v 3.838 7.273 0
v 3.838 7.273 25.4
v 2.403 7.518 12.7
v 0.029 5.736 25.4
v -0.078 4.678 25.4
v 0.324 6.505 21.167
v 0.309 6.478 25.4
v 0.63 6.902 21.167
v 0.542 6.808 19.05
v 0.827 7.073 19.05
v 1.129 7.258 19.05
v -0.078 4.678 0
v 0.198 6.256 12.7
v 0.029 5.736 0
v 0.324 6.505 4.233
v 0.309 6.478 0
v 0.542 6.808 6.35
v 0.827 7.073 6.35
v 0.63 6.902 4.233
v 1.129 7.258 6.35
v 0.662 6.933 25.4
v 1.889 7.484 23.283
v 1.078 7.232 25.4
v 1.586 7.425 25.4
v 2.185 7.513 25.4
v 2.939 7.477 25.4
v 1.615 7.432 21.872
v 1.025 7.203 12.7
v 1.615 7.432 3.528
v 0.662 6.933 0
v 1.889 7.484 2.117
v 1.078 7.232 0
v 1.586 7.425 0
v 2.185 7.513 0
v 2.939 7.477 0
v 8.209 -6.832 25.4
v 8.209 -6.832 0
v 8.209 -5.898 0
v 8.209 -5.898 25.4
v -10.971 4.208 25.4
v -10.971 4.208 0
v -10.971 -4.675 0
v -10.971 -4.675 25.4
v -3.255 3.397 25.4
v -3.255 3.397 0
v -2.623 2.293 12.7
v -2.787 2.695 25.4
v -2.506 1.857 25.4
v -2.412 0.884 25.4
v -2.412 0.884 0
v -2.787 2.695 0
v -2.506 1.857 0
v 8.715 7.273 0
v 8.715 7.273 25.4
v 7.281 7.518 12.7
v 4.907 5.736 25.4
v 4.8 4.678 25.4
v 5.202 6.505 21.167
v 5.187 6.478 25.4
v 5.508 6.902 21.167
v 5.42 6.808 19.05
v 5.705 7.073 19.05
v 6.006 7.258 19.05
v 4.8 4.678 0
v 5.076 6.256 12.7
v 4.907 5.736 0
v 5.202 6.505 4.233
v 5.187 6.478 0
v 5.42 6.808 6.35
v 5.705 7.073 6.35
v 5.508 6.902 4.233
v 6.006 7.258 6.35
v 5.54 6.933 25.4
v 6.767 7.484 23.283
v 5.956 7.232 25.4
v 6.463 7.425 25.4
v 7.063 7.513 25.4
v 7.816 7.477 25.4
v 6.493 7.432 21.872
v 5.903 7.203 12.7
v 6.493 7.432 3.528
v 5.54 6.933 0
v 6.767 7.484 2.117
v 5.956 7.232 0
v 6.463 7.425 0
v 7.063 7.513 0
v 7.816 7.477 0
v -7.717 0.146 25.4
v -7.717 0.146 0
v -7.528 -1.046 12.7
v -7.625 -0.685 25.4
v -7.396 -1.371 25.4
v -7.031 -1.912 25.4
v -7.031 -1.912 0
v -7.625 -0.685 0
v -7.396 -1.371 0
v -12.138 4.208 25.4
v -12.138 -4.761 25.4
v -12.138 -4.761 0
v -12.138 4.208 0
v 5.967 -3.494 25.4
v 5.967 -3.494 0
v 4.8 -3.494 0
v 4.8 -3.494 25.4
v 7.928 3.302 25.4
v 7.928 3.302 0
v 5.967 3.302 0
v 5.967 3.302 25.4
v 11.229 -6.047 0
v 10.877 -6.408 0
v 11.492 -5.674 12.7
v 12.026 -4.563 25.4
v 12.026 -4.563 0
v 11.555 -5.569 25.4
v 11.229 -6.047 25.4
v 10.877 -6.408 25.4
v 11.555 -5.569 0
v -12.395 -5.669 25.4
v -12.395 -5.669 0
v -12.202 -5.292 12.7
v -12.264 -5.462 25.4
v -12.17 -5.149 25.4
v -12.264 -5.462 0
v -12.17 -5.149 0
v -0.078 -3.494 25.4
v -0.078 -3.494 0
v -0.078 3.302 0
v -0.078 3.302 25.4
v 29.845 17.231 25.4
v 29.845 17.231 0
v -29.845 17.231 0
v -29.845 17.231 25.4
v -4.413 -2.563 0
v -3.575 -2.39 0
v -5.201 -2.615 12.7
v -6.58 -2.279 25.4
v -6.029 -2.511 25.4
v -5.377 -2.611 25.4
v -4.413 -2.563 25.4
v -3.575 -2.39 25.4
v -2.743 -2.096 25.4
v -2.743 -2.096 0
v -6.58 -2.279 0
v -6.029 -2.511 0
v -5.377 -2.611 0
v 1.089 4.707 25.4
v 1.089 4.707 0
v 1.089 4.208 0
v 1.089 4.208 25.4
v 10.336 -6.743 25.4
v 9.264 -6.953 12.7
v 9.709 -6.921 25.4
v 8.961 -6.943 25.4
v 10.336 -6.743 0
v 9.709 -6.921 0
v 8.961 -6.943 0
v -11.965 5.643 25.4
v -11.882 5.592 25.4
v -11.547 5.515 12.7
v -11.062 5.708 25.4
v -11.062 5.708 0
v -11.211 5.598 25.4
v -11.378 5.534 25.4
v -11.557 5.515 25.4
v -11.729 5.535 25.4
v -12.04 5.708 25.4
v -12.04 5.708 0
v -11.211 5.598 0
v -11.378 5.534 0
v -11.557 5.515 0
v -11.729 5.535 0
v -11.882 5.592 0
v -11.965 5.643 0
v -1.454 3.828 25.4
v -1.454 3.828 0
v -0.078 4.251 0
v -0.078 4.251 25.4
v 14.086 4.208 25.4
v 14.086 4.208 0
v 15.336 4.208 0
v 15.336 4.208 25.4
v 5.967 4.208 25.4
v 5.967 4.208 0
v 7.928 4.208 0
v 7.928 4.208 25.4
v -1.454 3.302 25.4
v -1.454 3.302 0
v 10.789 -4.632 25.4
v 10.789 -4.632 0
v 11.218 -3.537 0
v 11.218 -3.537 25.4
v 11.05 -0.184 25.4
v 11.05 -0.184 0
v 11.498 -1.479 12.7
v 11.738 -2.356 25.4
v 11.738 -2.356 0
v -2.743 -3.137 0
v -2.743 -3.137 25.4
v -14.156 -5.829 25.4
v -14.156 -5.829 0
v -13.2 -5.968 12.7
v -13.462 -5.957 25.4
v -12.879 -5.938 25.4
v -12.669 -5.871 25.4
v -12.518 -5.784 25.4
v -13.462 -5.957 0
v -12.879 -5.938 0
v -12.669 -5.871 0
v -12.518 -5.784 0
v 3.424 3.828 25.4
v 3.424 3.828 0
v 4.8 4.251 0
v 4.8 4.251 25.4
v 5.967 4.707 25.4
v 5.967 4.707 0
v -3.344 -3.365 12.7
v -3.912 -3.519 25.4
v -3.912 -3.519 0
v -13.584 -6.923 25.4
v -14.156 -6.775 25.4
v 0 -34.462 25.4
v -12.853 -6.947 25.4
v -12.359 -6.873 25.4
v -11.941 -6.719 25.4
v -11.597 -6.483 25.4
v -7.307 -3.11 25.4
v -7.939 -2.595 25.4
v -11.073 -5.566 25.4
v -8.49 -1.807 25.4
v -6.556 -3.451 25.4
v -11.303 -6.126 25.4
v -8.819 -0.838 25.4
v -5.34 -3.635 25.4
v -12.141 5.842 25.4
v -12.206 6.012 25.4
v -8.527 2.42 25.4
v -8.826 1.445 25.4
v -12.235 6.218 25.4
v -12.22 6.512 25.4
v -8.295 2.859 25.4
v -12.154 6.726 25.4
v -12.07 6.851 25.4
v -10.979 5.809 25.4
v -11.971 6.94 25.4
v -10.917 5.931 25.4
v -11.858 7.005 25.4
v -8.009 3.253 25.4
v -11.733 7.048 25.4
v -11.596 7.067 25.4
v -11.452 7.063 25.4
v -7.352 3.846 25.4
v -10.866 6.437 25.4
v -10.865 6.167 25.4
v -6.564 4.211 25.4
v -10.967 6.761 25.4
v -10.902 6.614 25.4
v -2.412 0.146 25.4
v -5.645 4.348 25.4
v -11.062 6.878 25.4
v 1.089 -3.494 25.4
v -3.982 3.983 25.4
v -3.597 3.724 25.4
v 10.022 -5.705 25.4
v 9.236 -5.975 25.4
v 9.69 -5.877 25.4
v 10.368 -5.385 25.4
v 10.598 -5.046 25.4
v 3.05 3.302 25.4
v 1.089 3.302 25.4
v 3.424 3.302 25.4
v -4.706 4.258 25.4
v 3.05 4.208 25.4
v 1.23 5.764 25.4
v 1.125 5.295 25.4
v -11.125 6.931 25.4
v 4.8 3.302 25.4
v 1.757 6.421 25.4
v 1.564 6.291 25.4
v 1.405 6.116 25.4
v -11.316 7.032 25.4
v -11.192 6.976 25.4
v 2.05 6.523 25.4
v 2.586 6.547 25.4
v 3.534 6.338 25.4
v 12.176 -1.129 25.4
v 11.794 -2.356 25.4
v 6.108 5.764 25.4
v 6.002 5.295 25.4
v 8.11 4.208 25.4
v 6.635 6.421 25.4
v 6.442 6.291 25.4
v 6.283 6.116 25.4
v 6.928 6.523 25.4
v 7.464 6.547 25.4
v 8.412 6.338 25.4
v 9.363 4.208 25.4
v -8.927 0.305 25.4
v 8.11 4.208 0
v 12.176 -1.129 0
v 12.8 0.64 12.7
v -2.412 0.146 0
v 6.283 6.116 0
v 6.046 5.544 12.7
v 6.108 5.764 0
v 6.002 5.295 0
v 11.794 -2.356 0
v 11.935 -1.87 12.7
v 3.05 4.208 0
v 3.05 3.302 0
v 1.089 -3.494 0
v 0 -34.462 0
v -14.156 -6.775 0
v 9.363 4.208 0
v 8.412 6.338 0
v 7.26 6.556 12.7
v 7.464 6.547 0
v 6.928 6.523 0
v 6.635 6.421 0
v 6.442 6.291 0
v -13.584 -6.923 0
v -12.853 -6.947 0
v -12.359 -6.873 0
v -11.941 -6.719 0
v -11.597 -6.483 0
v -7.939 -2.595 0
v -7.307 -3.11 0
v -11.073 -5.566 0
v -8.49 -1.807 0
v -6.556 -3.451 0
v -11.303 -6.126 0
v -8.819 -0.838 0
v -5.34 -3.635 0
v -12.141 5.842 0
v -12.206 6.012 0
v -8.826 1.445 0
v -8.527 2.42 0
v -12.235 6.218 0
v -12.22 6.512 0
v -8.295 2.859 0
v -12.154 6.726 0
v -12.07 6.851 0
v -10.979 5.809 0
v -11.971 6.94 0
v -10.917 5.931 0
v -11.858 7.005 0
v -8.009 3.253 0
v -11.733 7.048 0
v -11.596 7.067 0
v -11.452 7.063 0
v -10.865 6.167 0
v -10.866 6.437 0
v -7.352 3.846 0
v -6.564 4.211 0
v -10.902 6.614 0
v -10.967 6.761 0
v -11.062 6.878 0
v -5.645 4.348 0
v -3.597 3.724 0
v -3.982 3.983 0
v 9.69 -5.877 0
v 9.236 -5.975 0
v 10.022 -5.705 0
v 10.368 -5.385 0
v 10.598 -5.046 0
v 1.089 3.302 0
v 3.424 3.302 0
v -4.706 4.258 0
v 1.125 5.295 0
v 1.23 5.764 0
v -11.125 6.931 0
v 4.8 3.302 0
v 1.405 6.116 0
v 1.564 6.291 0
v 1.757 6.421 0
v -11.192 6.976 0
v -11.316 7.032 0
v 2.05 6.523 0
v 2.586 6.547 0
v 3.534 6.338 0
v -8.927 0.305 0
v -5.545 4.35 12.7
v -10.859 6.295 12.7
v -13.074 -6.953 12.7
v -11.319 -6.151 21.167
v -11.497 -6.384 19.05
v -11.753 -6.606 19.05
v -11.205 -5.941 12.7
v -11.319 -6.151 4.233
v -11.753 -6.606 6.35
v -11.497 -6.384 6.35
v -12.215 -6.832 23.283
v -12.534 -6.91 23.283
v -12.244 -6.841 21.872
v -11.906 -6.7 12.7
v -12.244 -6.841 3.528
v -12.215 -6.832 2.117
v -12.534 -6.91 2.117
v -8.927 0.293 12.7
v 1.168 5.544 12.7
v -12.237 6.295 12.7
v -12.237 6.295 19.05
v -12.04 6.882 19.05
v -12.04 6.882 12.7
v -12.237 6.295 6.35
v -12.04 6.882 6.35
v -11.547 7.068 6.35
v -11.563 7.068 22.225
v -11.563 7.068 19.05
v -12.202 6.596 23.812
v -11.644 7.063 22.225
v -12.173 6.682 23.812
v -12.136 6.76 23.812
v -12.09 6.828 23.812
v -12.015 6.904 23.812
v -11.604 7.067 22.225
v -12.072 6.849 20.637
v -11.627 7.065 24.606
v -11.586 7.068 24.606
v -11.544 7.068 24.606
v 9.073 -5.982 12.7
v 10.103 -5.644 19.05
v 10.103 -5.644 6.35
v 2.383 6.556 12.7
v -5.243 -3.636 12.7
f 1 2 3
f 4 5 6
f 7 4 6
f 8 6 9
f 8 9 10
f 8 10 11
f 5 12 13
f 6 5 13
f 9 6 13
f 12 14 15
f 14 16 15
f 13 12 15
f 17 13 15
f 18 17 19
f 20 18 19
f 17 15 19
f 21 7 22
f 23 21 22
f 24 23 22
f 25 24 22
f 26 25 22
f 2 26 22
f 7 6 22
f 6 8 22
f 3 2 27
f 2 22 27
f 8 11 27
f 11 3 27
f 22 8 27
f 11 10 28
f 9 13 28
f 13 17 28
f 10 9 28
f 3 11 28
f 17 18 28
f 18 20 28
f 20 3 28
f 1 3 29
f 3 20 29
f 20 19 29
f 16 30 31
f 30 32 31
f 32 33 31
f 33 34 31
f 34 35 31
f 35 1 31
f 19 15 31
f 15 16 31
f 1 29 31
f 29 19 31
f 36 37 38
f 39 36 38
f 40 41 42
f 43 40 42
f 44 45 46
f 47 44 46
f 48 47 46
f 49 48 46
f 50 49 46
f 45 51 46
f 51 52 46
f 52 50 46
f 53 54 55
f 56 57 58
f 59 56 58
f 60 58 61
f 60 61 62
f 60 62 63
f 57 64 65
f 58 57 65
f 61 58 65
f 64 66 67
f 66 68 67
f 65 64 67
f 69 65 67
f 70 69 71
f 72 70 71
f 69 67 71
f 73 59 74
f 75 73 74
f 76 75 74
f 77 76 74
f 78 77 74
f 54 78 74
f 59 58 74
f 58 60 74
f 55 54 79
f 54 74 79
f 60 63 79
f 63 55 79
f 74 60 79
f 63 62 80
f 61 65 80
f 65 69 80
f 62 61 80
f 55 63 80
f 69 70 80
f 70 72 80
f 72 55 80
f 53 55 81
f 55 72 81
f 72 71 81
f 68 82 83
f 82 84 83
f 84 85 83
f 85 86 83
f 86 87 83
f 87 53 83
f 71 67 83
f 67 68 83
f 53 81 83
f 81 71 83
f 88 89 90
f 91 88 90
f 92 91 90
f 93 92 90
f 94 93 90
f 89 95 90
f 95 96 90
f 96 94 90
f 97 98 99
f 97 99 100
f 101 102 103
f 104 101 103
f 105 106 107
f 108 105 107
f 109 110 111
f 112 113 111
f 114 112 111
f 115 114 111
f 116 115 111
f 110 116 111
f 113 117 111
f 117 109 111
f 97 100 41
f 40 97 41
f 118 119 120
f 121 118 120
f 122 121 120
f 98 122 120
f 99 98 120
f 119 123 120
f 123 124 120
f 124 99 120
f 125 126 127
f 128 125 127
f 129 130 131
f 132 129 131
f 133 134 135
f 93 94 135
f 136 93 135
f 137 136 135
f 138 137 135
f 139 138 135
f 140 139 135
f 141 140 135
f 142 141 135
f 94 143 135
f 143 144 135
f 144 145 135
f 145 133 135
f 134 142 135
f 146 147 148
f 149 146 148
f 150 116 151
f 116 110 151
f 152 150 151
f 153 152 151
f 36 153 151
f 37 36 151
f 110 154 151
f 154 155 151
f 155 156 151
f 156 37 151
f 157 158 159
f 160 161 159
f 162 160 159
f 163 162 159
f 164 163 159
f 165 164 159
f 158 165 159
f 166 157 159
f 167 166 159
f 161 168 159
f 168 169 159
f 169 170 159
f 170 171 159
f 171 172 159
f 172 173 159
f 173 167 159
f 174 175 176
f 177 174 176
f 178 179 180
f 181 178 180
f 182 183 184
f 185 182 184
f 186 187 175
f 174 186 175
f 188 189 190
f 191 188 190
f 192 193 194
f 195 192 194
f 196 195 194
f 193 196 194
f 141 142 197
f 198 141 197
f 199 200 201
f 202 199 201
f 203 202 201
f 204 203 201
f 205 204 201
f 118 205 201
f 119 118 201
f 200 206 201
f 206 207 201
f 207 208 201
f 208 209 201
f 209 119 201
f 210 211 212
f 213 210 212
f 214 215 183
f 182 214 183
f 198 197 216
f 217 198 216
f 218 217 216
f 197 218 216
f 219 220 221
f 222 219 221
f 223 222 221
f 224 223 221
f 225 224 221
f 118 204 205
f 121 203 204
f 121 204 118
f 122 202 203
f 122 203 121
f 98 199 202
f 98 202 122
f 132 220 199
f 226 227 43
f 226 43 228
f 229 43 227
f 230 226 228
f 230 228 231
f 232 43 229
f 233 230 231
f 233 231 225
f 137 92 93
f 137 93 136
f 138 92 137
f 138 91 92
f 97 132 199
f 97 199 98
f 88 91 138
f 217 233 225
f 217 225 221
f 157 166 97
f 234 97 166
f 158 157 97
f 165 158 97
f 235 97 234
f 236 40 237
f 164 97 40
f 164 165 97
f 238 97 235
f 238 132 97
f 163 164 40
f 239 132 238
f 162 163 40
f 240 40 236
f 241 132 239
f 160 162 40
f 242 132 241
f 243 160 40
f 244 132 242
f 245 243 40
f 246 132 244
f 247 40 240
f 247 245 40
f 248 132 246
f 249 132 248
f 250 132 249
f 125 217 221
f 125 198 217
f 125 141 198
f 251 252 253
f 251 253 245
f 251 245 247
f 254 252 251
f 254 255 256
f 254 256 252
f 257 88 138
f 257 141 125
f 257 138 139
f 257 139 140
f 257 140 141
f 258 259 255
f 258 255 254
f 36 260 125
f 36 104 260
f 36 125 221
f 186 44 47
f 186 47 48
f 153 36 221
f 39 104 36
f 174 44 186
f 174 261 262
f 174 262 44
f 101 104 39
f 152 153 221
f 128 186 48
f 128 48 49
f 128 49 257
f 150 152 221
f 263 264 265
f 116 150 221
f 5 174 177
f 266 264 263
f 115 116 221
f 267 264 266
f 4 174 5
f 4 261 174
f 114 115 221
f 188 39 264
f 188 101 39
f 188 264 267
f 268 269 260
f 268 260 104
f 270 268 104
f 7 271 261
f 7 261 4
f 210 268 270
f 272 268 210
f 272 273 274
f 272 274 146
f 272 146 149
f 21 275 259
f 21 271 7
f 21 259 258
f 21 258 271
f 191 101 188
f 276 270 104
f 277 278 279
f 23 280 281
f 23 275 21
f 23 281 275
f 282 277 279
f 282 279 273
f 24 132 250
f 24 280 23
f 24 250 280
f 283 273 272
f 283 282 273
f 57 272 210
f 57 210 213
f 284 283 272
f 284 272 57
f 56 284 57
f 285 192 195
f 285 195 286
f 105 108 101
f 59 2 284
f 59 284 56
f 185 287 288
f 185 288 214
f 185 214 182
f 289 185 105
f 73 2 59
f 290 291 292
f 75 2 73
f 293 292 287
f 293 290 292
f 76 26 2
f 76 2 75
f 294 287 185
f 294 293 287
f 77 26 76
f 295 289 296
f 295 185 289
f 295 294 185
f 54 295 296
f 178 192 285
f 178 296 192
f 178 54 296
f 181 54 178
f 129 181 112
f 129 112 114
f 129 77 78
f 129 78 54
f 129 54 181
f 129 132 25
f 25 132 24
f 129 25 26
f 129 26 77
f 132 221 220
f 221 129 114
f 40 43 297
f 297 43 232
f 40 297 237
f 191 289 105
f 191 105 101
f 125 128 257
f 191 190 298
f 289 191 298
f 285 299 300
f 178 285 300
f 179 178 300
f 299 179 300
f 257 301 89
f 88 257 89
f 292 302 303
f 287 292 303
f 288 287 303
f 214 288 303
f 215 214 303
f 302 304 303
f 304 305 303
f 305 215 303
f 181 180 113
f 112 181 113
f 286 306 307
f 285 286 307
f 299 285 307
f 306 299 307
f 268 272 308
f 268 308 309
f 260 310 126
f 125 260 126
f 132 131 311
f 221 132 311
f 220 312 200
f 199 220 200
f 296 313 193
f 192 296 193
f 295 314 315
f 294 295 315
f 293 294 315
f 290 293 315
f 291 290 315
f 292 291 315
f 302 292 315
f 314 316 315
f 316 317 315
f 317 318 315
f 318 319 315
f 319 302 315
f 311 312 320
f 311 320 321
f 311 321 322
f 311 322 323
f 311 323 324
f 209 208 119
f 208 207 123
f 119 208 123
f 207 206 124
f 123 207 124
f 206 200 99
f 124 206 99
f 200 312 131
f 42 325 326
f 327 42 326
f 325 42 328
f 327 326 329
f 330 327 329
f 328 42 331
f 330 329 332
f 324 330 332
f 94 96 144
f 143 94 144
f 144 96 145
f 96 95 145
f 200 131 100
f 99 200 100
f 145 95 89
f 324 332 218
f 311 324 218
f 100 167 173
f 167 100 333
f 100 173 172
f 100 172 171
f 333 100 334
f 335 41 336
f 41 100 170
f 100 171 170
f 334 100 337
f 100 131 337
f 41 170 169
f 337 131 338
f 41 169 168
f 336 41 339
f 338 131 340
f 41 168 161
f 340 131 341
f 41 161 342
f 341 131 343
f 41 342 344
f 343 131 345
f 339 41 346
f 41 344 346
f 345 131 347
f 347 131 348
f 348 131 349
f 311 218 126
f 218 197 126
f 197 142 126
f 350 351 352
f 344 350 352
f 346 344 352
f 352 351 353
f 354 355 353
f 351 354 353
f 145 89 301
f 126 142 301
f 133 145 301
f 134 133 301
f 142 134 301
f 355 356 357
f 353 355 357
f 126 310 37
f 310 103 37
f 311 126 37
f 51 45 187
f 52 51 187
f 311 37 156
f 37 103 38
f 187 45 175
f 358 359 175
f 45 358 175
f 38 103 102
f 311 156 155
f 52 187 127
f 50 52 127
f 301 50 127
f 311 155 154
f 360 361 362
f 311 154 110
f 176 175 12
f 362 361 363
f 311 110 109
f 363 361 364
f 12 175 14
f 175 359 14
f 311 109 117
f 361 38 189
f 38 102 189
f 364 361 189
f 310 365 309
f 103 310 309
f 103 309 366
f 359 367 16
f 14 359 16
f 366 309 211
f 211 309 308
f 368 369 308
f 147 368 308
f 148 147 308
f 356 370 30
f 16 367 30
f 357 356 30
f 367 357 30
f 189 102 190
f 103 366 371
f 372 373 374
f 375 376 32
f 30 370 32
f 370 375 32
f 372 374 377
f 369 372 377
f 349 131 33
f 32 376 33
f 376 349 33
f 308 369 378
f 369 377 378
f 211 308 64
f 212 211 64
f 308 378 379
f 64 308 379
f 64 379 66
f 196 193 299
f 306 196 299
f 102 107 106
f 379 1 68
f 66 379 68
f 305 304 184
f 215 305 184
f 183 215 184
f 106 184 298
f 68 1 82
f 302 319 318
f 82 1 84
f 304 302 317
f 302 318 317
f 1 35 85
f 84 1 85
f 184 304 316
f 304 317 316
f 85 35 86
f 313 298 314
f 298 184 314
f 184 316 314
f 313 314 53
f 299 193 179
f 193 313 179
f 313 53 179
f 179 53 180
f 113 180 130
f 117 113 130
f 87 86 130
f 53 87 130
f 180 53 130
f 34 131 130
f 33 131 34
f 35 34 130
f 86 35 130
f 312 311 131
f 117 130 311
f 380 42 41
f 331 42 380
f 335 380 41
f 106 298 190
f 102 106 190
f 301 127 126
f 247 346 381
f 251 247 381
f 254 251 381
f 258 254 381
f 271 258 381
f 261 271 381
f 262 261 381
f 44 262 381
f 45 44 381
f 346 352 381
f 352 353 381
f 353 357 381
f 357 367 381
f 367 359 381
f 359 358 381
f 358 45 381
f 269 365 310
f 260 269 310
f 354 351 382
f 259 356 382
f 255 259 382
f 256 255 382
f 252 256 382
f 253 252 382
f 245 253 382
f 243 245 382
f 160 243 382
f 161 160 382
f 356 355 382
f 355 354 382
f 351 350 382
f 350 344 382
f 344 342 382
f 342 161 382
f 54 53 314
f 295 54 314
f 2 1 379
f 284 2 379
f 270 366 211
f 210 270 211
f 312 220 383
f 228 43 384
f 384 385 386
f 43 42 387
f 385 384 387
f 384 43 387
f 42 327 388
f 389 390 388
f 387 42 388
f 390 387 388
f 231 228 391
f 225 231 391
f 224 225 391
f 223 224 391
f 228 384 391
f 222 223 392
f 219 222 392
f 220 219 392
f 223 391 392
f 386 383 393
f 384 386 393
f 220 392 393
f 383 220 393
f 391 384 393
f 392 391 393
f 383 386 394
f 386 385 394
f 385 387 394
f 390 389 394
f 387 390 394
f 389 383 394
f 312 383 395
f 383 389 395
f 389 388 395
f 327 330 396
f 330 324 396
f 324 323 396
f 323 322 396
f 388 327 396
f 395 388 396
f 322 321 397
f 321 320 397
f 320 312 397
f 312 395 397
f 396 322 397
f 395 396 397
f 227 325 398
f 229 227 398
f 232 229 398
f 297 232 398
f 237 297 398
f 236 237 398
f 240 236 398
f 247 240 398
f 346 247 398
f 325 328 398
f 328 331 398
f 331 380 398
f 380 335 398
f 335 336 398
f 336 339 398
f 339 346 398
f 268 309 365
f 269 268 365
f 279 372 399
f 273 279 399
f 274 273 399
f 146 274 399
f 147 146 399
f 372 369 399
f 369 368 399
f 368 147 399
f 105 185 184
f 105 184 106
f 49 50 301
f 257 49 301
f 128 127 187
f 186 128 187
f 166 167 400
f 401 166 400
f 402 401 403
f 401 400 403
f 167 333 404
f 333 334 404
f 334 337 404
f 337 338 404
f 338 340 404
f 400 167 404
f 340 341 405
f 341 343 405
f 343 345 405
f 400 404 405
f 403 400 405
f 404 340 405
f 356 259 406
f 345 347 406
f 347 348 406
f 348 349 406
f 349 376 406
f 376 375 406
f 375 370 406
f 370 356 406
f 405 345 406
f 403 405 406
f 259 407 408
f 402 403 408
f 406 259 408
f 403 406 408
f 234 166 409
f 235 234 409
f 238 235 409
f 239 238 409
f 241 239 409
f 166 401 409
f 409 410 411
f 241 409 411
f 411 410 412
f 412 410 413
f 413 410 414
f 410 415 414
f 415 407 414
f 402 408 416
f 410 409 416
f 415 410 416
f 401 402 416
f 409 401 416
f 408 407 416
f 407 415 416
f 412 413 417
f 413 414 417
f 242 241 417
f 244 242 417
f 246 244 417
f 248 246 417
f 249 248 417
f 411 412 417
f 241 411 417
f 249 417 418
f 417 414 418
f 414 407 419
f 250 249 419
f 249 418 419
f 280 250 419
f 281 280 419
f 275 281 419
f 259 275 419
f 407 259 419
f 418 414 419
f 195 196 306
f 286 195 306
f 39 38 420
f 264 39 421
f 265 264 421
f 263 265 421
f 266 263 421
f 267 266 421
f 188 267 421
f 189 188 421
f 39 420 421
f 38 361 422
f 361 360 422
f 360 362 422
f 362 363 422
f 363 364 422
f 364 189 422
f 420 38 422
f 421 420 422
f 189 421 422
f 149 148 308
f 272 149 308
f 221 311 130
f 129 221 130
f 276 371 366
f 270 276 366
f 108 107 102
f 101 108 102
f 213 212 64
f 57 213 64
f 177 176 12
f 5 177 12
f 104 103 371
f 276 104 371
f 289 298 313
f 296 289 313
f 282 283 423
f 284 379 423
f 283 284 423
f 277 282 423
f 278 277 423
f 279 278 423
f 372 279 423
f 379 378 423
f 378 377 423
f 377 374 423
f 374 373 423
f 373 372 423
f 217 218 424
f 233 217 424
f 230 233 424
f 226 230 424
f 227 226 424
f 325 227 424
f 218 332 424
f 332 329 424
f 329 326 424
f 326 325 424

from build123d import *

# Parameters (mm, degrees)
F1_DEPTH = 25.4


with BuildPart() as f1:
    # F0 (on Top) → F1 (new body)
    with BuildSketch(Plane.XY):
        Polygon((29.8450878518, 17.2310695052), (-29.8450878518, 17.2310695052), (0, -34.4621390104), align=None)
        with BuildLine():
            add(Edge.make_bspline(
                [(-10.9711358257, -4.6750637359), (-10.9711358257, -6.9531576902), (-13.0738187944, -6.9531576902)],
                knots=[0, 0, 0, 1, 1, 1], degree=2))
            add(Edge.make_bspline(
                [(-13.0738187944, -6.9531576902), (-13.7417298551, -6.9531576902), (-14.1555198724, -6.7754978458)],
                knots=[0, 0, 0, 1, 1, 1], degree=2))
            Line((-14.1555198724, -6.7754978458), (-14.1555198724, -5.8287282952))
            add(Edge.make_bspline(
                [(-14.1555198724, -5.8287282952), (-13.6697663738, -5.9681575401), (-13.1997548867, -5.9681575401)],
                knots=[0, 0, 0, 1, 1, 1], degree=2))
            add(Edge.make_bspline(
                [(-13.1997548867, -5.9681575401), (-12.6510333419, -5.9681575401), (-12.3946634398, -5.6690593211)],
                knots=[0, 0, 0, 1, 1, 1], degree=2))
            add(Edge.make_bspline(
                [(-12.3946634398, -5.6690593211), (-12.1382935377, -5.369961102), (-12.1382935377, -4.7605203699)],
                knots=[0, 0, 0, 1, 1, 1], degree=2))
            Line((-12.1382935377, -4.7605203699), (-12.1382935377, 4.2079284849))
            Line((-12.1382935377, 4.2079284849), (-10.9711358257, 4.2079284849))
            Line((-10.9711358257, 4.2079284849), (-10.9711358257, -4.6750637359))
        make_face(mode=Mode.SUBTRACT)
        with BuildLine():
            add(Edge.make_bspline(
                [(-3.9119680837, -3.5191503178), (-4.4629384873, -3.6360909749), (-5.2432924874, -3.6360909749)],
                knots=[0, 0, 0, 1, 1, 1], degree=2))
            add(Edge.make_bspline(
                [(-5.2432924874, -3.6360909749), (-6.9501763091, -3.6360909749), (-7.9385497473, -2.5948693551)],
                knots=[0, 0, 0, 1, 1, 1], degree=2))
            add(Edge.make_bspline(
                [(-7.9385497473, -2.5948693551), (-8.9269231856, -1.5536477353), (-8.9269231856, 0.2926653314)],
                knots=[0, 0, 0, 1, 1, 1], degree=2))
            add(Edge.make_bspline(
                [(-8.9269231856, 0.2926653314), (-8.9269231856, 2.1569692683), (-8.0093887992, 3.2532879285)],
                knots=[0, 0, 0, 1, 1, 1], degree=2))
            add(Edge.make_bspline(
                [(-8.0093887992, 3.2532879285), (-7.0918544129, 4.3496065886), (-5.5446395653, 4.3496065886)],
                knots=[0, 0, 0, 1, 1, 1], degree=2))
            add(Edge.make_bspline(
                [(-5.5446395653, 4.3496065886), (-4.0986233633, 4.3496065886), (-3.255301317, 3.397214891)],
                knots=[0, 0, 0, 1, 1, 1], degree=2))
            add(Edge.make_bspline(
                [(-3.255301317, 3.397214891), (-2.4119792708, 2.4448231935), (-2.4119792708, 0.8841151932)],
                knots=[0, 0, 0, 1, 1, 1], degree=2))
            Line((-2.4119792708, 0.8841151932), (-2.4119792708, 0.14648951))
            Line((-2.4119792708, 0.14648951), (-7.7170371565, 0.14648951))
            add(Edge.make_bspline(
                [(-7.7170371565, 0.14648951), (-7.6810554159, -1.2095723404), (-7.0311352255, -1.9123407123)],
                knots=[0, 0, 0, 1, 1, 1], degree=2))
            add(Edge.make_bspline(
                [(-7.0311352255, -1.9123407123), (-6.3812150352, -2.6151090842), (-5.2005641704, -2.6151090842)],
                knots=[0, 0, 0, 1, 1, 1], degree=2))
            add(Edge.make_bspline(
                [(-5.2005641704, -2.6151090842), (-3.9569452595, -2.6151090842), (-2.7425615129, -2.0956227037)],
                knots=[0, 0, 0, 1, 1, 1], degree=2))
            Line((-2.7425615129, -2.0956227037), (-2.7425615129, -3.1368443235))
            add(Edge.make_bspline(
                [(-2.7425615129, -3.1368443235), (-3.3609976802, -3.4022096607), (-3.9119680837, -3.5191503178)],
                knots=[0, 0, 0, 1, 1, 1], degree=2))
        make_face(mode=Mode.SUBTRACT)
        with BuildLine():
            add(Edge.make_bspline(
                [(-12.0404681804, 5.7079172978), (-12.2372433245, 5.9013191538), (-12.2372433245, 6.294869442)],
                knots=[0, 0, 0, 1, 1, 1], degree=2))
            add(Edge.make_bspline(
                [(-12.2372433245, 6.294869442), (-12.2372433245, 6.6951663066), (-12.0404681804, 6.8818215862)],
                knots=[0, 0, 0, 1, 1, 1], degree=2))
            add(Edge.make_bspline(
                [(-12.0404681804, 6.8818215862), (-11.8436930363, 7.0684768658), (-11.546843676, 7.0684768658)],
                knots=[0, 0, 0, 1, 1, 1], degree=2))
            add(Edge.make_bspline(
                [(-11.546843676, 7.0684768658), (-11.2657363272, 7.0684768658), (-11.0622146067, 6.878448298)],
                knots=[0, 0, 0, 1, 1, 1], degree=2))
            add(Edge.make_bspline(
                [(-11.0622146067, 6.878448298), (-10.8586928862, 6.6884197303), (-10.8586928862, 6.294869442)],
                knots=[0, 0, 0, 1, 1, 1], degree=2))
            add(Edge.make_bspline(
                [(-10.8586928862, 6.294869442), (-10.8586928862, 5.9013191538), (-11.0622146067, 5.7079172978)],
                knots=[0, 0, 0, 1, 1, 1], degree=2))
            add(Edge.make_bspline(
                [(-11.0622146067, 5.7079172978), (-11.2657363272, 5.5145154419), (-11.546843676, 5.5145154419)],
                knots=[0, 0, 0, 1, 1, 1], degree=2))
            add(Edge.make_bspline(
                [(-11.546843676, 5.5145154419), (-11.8436930363, 5.5145154419), (-12.0404681804, 5.7079172978)],
                knots=[0, 0, 0, 1, 1, 1], degree=2))
        make_face(mode=Mode.SUBTRACT)
        with BuildLine():
            Line((3.0504987303, 4.2079284849), (3.0504987303, 3.3016383925))
            Line((3.0504987303, 3.3016383925), (1.0894938653, 3.3016383925))
            Line((1.0894938653, 3.3016383925), (1.0894938653, -3.4944128711))
            Line((1.0894938653, -3.4944128711), (-0.0776638467, -3.4944128711))
            Line((-0.0776638467, -3.4944128711), (-0.0776638467, 3.3016383925))
            Line((-0.0776638467, 3.3016383925), (-1.4539654262, 3.3016383925))
            Line((-1.4539654262, 3.3016383925), (-1.4539654262, 3.8278713493))
            Line((-1.4539654262, 3.8278713493), (-0.0776638467, 4.2506568019))
            Line((-0.0776638467, 4.2506568019), (-0.0776638467, 4.677939972))
            add(Edge.make_bspline(
                [(-0.0776638467, 4.677939972), (-0.0776638467, 7.5182486238), (2.4028273987, 7.5182486238)],
                knots=[0, 0, 0, 1, 1, 1], degree=2))
            add(Edge.make_bspline(
                [(2.4028273987, 7.5182486238), (3.0145169896, 7.5182486238), (3.8375993068, 7.2731230157)],
                knots=[0, 0, 0, 1, 1, 1], degree=2))
            Line((3.8375993068, 7.2731230157), (3.5340033701, 6.337597759))
            add(Edge.make_bspline(
                [(3.5340033701, 6.337597759), (2.8593457331, 6.5557370617), (2.3825876696, 6.5557370617)],
                knots=[0, 0, 0, 1, 1, 1], degree=2))
            add(Edge.make_bspline(
                [(2.3825876696, 6.5557370617), (1.7214231853, 6.5557370617), (1.4054585253, 6.1160851682)],
                knots=[0, 0, 0, 1, 1, 1], degree=2))
            add(Edge.make_bspline(
                [(1.4054585253, 6.1160851682), (1.0894938653, 5.6764332748), (1.0894938653, 4.7071751362)],
                knots=[0, 0, 0, 1, 1, 1], degree=2))
            Line((1.0894938653, 4.7071751362), (1.0894938653, 4.2079284849))
            Line((1.0894938653, 4.2079284849), (3.0504987303, 4.2079284849))
        make_face(mode=Mode.SUBTRACT)
        with BuildLine():
            Line((7.9282734459, 4.2079284849), (7.9282734459, 3.3016383925))
            Line((7.9282734459, 3.3016383925), (5.967268581, 3.3016383925))
            Line((5.967268581, 3.3016383925), (5.967268581, -3.4944128711))
            Line((5.967268581, -3.4944128711), (4.8001108689, -3.4944128711))
            Line((4.8001108689, -3.4944128711), (4.8001108689, 3.3016383925))
            Line((4.8001108689, 3.3016383925), (3.4238092894, 3.3016383925))
            Line((3.4238092894, 3.3016383925), (3.4238092894, 3.8278713493))
            Line((3.4238092894, 3.8278713493), (4.8001108689, 4.2506568019))
            Line((4.8001108689, 4.2506568019), (4.8001108689, 4.677939972))
            add(Edge.make_bspline(
                [(4.8001108689, 4.677939972), (4.8001108689, 7.5182486238), (7.2806021144, 7.5182486238)],
                knots=[0, 0, 0, 1, 1, 1], degree=2))
            add(Edge.make_bspline(
                [(7.2806021144, 7.5182486238), (7.8922917052, 7.5182486238), (8.7153740224, 7.2731230157)],
                knots=[0, 0, 0, 1, 1, 1], degree=2))
            Line((8.7153740224, 7.2731230157), (8.4117780858, 6.337597759))
            add(Edge.make_bspline(
                [(8.4117780858, 6.337597759), (7.7371204487, 6.5557370617), (7.2603623852, 6.5557370617)],
                knots=[0, 0, 0, 1, 1, 1], degree=2))
            add(Edge.make_bspline(
                [(7.2603623852, 6.5557370617), (6.599197901, 6.5557370617), (6.283233241, 6.1160851682)],
                knots=[0, 0, 0, 1, 1, 1], degree=2))
            add(Edge.make_bspline(
                [(6.283233241, 6.1160851682), (5.967268581, 5.6764332748), (5.967268581, 4.7071751362)],
                knots=[0, 0, 0, 1, 1, 1], degree=2))
            Line((5.967268581, 4.7071751362), (5.967268581, 4.2079284849))
            Line((5.967268581, 4.2079284849), (7.9282734459, 4.2079284849))
        make_face(mode=Mode.SUBTRACT)
        with BuildLine():
            Line((11.2183538557, -3.5371411881), (8.1104310079, 4.2079284849))
            Line((8.1104310079, 4.2079284849), (9.3630453539, 4.2079284849))
            Line((9.3630453539, 4.2079284849), (11.0496894465, -0.1840927321))
            add(Edge.make_bspline(
                [(11.0496894465, -0.1840927321), (11.6029087088, -1.6885792627), (11.7378402362, -2.3564903233)],
                knots=[0, 0, 0, 1, 1, 1], degree=2))
            Line((11.7378402362, -2.3564903233), (11.794061706, -2.3564903233))
            add(Edge.make_bspline(
                [(11.794061706, -2.3564903233), (11.8840160576, -1.9966729169), (12.1763677003, -1.1286134239)],
                knots=[0, 0, 0, 1, 1, 1], degree=2))
            add(Edge.make_bspline(
                [(12.1763677003, -1.1286134239), (12.468719343, -0.260553931), (14.0856488131, 4.2079284849)],
                knots=[0, 0, 0, 1, 1, 1], degree=2))
            Line((14.0856488131, 4.2079284849), (15.3360143003, 4.2079284849))
            Line((15.3360143003, 4.2079284849), (12.0256941614, -4.5626207964))
            add(Edge.make_bspline(
                [(12.0256941614, -4.5626207964), (11.5331940863, -5.862461177), (10.8765273196, -6.4078094336)],
                knots=[0, 0, 0, 1, 1, 1], degree=2))
            add(Edge.make_bspline(
                [(10.8765273196, -6.4078094336), (10.219860553, -6.9531576902), (9.2640955672, -6.9531576902)],
                knots=[0, 0, 0, 1, 1, 1], degree=2))
            add(Edge.make_bspline(
                [(9.2640955672, -6.9531576902), (8.7288671751, -6.9531576902), (8.2093807946, -6.8317193155)],
                knots=[0, 0, 0, 1, 1, 1], degree=2))
            Line((8.2093807946, -6.8317193155), (8.2093807946, -5.8984429176))
            add(Edge.make_bspline(
                [(8.2093807946, -5.8984429176), (8.5961845065, -5.9816506929), (9.07294257, -5.9816506929)],
                knots=[0, 0, 0, 1, 1, 1], degree=2))
            add(Edge.make_bspline(
                [(9.07294257, -5.9816506929), (10.2760820227, -5.9816506929), (10.7888218268, -4.6323354188)],
                knots=[0, 0, 0, 1, 1, 1], degree=2))
            Line((10.7888218268, -4.6323354188), (11.2183538557, -3.5371411881))
        make_face(mode=Mode.SUBTRACT)
    extrude(amount=F1_DEPTH)


solid = f1.part
